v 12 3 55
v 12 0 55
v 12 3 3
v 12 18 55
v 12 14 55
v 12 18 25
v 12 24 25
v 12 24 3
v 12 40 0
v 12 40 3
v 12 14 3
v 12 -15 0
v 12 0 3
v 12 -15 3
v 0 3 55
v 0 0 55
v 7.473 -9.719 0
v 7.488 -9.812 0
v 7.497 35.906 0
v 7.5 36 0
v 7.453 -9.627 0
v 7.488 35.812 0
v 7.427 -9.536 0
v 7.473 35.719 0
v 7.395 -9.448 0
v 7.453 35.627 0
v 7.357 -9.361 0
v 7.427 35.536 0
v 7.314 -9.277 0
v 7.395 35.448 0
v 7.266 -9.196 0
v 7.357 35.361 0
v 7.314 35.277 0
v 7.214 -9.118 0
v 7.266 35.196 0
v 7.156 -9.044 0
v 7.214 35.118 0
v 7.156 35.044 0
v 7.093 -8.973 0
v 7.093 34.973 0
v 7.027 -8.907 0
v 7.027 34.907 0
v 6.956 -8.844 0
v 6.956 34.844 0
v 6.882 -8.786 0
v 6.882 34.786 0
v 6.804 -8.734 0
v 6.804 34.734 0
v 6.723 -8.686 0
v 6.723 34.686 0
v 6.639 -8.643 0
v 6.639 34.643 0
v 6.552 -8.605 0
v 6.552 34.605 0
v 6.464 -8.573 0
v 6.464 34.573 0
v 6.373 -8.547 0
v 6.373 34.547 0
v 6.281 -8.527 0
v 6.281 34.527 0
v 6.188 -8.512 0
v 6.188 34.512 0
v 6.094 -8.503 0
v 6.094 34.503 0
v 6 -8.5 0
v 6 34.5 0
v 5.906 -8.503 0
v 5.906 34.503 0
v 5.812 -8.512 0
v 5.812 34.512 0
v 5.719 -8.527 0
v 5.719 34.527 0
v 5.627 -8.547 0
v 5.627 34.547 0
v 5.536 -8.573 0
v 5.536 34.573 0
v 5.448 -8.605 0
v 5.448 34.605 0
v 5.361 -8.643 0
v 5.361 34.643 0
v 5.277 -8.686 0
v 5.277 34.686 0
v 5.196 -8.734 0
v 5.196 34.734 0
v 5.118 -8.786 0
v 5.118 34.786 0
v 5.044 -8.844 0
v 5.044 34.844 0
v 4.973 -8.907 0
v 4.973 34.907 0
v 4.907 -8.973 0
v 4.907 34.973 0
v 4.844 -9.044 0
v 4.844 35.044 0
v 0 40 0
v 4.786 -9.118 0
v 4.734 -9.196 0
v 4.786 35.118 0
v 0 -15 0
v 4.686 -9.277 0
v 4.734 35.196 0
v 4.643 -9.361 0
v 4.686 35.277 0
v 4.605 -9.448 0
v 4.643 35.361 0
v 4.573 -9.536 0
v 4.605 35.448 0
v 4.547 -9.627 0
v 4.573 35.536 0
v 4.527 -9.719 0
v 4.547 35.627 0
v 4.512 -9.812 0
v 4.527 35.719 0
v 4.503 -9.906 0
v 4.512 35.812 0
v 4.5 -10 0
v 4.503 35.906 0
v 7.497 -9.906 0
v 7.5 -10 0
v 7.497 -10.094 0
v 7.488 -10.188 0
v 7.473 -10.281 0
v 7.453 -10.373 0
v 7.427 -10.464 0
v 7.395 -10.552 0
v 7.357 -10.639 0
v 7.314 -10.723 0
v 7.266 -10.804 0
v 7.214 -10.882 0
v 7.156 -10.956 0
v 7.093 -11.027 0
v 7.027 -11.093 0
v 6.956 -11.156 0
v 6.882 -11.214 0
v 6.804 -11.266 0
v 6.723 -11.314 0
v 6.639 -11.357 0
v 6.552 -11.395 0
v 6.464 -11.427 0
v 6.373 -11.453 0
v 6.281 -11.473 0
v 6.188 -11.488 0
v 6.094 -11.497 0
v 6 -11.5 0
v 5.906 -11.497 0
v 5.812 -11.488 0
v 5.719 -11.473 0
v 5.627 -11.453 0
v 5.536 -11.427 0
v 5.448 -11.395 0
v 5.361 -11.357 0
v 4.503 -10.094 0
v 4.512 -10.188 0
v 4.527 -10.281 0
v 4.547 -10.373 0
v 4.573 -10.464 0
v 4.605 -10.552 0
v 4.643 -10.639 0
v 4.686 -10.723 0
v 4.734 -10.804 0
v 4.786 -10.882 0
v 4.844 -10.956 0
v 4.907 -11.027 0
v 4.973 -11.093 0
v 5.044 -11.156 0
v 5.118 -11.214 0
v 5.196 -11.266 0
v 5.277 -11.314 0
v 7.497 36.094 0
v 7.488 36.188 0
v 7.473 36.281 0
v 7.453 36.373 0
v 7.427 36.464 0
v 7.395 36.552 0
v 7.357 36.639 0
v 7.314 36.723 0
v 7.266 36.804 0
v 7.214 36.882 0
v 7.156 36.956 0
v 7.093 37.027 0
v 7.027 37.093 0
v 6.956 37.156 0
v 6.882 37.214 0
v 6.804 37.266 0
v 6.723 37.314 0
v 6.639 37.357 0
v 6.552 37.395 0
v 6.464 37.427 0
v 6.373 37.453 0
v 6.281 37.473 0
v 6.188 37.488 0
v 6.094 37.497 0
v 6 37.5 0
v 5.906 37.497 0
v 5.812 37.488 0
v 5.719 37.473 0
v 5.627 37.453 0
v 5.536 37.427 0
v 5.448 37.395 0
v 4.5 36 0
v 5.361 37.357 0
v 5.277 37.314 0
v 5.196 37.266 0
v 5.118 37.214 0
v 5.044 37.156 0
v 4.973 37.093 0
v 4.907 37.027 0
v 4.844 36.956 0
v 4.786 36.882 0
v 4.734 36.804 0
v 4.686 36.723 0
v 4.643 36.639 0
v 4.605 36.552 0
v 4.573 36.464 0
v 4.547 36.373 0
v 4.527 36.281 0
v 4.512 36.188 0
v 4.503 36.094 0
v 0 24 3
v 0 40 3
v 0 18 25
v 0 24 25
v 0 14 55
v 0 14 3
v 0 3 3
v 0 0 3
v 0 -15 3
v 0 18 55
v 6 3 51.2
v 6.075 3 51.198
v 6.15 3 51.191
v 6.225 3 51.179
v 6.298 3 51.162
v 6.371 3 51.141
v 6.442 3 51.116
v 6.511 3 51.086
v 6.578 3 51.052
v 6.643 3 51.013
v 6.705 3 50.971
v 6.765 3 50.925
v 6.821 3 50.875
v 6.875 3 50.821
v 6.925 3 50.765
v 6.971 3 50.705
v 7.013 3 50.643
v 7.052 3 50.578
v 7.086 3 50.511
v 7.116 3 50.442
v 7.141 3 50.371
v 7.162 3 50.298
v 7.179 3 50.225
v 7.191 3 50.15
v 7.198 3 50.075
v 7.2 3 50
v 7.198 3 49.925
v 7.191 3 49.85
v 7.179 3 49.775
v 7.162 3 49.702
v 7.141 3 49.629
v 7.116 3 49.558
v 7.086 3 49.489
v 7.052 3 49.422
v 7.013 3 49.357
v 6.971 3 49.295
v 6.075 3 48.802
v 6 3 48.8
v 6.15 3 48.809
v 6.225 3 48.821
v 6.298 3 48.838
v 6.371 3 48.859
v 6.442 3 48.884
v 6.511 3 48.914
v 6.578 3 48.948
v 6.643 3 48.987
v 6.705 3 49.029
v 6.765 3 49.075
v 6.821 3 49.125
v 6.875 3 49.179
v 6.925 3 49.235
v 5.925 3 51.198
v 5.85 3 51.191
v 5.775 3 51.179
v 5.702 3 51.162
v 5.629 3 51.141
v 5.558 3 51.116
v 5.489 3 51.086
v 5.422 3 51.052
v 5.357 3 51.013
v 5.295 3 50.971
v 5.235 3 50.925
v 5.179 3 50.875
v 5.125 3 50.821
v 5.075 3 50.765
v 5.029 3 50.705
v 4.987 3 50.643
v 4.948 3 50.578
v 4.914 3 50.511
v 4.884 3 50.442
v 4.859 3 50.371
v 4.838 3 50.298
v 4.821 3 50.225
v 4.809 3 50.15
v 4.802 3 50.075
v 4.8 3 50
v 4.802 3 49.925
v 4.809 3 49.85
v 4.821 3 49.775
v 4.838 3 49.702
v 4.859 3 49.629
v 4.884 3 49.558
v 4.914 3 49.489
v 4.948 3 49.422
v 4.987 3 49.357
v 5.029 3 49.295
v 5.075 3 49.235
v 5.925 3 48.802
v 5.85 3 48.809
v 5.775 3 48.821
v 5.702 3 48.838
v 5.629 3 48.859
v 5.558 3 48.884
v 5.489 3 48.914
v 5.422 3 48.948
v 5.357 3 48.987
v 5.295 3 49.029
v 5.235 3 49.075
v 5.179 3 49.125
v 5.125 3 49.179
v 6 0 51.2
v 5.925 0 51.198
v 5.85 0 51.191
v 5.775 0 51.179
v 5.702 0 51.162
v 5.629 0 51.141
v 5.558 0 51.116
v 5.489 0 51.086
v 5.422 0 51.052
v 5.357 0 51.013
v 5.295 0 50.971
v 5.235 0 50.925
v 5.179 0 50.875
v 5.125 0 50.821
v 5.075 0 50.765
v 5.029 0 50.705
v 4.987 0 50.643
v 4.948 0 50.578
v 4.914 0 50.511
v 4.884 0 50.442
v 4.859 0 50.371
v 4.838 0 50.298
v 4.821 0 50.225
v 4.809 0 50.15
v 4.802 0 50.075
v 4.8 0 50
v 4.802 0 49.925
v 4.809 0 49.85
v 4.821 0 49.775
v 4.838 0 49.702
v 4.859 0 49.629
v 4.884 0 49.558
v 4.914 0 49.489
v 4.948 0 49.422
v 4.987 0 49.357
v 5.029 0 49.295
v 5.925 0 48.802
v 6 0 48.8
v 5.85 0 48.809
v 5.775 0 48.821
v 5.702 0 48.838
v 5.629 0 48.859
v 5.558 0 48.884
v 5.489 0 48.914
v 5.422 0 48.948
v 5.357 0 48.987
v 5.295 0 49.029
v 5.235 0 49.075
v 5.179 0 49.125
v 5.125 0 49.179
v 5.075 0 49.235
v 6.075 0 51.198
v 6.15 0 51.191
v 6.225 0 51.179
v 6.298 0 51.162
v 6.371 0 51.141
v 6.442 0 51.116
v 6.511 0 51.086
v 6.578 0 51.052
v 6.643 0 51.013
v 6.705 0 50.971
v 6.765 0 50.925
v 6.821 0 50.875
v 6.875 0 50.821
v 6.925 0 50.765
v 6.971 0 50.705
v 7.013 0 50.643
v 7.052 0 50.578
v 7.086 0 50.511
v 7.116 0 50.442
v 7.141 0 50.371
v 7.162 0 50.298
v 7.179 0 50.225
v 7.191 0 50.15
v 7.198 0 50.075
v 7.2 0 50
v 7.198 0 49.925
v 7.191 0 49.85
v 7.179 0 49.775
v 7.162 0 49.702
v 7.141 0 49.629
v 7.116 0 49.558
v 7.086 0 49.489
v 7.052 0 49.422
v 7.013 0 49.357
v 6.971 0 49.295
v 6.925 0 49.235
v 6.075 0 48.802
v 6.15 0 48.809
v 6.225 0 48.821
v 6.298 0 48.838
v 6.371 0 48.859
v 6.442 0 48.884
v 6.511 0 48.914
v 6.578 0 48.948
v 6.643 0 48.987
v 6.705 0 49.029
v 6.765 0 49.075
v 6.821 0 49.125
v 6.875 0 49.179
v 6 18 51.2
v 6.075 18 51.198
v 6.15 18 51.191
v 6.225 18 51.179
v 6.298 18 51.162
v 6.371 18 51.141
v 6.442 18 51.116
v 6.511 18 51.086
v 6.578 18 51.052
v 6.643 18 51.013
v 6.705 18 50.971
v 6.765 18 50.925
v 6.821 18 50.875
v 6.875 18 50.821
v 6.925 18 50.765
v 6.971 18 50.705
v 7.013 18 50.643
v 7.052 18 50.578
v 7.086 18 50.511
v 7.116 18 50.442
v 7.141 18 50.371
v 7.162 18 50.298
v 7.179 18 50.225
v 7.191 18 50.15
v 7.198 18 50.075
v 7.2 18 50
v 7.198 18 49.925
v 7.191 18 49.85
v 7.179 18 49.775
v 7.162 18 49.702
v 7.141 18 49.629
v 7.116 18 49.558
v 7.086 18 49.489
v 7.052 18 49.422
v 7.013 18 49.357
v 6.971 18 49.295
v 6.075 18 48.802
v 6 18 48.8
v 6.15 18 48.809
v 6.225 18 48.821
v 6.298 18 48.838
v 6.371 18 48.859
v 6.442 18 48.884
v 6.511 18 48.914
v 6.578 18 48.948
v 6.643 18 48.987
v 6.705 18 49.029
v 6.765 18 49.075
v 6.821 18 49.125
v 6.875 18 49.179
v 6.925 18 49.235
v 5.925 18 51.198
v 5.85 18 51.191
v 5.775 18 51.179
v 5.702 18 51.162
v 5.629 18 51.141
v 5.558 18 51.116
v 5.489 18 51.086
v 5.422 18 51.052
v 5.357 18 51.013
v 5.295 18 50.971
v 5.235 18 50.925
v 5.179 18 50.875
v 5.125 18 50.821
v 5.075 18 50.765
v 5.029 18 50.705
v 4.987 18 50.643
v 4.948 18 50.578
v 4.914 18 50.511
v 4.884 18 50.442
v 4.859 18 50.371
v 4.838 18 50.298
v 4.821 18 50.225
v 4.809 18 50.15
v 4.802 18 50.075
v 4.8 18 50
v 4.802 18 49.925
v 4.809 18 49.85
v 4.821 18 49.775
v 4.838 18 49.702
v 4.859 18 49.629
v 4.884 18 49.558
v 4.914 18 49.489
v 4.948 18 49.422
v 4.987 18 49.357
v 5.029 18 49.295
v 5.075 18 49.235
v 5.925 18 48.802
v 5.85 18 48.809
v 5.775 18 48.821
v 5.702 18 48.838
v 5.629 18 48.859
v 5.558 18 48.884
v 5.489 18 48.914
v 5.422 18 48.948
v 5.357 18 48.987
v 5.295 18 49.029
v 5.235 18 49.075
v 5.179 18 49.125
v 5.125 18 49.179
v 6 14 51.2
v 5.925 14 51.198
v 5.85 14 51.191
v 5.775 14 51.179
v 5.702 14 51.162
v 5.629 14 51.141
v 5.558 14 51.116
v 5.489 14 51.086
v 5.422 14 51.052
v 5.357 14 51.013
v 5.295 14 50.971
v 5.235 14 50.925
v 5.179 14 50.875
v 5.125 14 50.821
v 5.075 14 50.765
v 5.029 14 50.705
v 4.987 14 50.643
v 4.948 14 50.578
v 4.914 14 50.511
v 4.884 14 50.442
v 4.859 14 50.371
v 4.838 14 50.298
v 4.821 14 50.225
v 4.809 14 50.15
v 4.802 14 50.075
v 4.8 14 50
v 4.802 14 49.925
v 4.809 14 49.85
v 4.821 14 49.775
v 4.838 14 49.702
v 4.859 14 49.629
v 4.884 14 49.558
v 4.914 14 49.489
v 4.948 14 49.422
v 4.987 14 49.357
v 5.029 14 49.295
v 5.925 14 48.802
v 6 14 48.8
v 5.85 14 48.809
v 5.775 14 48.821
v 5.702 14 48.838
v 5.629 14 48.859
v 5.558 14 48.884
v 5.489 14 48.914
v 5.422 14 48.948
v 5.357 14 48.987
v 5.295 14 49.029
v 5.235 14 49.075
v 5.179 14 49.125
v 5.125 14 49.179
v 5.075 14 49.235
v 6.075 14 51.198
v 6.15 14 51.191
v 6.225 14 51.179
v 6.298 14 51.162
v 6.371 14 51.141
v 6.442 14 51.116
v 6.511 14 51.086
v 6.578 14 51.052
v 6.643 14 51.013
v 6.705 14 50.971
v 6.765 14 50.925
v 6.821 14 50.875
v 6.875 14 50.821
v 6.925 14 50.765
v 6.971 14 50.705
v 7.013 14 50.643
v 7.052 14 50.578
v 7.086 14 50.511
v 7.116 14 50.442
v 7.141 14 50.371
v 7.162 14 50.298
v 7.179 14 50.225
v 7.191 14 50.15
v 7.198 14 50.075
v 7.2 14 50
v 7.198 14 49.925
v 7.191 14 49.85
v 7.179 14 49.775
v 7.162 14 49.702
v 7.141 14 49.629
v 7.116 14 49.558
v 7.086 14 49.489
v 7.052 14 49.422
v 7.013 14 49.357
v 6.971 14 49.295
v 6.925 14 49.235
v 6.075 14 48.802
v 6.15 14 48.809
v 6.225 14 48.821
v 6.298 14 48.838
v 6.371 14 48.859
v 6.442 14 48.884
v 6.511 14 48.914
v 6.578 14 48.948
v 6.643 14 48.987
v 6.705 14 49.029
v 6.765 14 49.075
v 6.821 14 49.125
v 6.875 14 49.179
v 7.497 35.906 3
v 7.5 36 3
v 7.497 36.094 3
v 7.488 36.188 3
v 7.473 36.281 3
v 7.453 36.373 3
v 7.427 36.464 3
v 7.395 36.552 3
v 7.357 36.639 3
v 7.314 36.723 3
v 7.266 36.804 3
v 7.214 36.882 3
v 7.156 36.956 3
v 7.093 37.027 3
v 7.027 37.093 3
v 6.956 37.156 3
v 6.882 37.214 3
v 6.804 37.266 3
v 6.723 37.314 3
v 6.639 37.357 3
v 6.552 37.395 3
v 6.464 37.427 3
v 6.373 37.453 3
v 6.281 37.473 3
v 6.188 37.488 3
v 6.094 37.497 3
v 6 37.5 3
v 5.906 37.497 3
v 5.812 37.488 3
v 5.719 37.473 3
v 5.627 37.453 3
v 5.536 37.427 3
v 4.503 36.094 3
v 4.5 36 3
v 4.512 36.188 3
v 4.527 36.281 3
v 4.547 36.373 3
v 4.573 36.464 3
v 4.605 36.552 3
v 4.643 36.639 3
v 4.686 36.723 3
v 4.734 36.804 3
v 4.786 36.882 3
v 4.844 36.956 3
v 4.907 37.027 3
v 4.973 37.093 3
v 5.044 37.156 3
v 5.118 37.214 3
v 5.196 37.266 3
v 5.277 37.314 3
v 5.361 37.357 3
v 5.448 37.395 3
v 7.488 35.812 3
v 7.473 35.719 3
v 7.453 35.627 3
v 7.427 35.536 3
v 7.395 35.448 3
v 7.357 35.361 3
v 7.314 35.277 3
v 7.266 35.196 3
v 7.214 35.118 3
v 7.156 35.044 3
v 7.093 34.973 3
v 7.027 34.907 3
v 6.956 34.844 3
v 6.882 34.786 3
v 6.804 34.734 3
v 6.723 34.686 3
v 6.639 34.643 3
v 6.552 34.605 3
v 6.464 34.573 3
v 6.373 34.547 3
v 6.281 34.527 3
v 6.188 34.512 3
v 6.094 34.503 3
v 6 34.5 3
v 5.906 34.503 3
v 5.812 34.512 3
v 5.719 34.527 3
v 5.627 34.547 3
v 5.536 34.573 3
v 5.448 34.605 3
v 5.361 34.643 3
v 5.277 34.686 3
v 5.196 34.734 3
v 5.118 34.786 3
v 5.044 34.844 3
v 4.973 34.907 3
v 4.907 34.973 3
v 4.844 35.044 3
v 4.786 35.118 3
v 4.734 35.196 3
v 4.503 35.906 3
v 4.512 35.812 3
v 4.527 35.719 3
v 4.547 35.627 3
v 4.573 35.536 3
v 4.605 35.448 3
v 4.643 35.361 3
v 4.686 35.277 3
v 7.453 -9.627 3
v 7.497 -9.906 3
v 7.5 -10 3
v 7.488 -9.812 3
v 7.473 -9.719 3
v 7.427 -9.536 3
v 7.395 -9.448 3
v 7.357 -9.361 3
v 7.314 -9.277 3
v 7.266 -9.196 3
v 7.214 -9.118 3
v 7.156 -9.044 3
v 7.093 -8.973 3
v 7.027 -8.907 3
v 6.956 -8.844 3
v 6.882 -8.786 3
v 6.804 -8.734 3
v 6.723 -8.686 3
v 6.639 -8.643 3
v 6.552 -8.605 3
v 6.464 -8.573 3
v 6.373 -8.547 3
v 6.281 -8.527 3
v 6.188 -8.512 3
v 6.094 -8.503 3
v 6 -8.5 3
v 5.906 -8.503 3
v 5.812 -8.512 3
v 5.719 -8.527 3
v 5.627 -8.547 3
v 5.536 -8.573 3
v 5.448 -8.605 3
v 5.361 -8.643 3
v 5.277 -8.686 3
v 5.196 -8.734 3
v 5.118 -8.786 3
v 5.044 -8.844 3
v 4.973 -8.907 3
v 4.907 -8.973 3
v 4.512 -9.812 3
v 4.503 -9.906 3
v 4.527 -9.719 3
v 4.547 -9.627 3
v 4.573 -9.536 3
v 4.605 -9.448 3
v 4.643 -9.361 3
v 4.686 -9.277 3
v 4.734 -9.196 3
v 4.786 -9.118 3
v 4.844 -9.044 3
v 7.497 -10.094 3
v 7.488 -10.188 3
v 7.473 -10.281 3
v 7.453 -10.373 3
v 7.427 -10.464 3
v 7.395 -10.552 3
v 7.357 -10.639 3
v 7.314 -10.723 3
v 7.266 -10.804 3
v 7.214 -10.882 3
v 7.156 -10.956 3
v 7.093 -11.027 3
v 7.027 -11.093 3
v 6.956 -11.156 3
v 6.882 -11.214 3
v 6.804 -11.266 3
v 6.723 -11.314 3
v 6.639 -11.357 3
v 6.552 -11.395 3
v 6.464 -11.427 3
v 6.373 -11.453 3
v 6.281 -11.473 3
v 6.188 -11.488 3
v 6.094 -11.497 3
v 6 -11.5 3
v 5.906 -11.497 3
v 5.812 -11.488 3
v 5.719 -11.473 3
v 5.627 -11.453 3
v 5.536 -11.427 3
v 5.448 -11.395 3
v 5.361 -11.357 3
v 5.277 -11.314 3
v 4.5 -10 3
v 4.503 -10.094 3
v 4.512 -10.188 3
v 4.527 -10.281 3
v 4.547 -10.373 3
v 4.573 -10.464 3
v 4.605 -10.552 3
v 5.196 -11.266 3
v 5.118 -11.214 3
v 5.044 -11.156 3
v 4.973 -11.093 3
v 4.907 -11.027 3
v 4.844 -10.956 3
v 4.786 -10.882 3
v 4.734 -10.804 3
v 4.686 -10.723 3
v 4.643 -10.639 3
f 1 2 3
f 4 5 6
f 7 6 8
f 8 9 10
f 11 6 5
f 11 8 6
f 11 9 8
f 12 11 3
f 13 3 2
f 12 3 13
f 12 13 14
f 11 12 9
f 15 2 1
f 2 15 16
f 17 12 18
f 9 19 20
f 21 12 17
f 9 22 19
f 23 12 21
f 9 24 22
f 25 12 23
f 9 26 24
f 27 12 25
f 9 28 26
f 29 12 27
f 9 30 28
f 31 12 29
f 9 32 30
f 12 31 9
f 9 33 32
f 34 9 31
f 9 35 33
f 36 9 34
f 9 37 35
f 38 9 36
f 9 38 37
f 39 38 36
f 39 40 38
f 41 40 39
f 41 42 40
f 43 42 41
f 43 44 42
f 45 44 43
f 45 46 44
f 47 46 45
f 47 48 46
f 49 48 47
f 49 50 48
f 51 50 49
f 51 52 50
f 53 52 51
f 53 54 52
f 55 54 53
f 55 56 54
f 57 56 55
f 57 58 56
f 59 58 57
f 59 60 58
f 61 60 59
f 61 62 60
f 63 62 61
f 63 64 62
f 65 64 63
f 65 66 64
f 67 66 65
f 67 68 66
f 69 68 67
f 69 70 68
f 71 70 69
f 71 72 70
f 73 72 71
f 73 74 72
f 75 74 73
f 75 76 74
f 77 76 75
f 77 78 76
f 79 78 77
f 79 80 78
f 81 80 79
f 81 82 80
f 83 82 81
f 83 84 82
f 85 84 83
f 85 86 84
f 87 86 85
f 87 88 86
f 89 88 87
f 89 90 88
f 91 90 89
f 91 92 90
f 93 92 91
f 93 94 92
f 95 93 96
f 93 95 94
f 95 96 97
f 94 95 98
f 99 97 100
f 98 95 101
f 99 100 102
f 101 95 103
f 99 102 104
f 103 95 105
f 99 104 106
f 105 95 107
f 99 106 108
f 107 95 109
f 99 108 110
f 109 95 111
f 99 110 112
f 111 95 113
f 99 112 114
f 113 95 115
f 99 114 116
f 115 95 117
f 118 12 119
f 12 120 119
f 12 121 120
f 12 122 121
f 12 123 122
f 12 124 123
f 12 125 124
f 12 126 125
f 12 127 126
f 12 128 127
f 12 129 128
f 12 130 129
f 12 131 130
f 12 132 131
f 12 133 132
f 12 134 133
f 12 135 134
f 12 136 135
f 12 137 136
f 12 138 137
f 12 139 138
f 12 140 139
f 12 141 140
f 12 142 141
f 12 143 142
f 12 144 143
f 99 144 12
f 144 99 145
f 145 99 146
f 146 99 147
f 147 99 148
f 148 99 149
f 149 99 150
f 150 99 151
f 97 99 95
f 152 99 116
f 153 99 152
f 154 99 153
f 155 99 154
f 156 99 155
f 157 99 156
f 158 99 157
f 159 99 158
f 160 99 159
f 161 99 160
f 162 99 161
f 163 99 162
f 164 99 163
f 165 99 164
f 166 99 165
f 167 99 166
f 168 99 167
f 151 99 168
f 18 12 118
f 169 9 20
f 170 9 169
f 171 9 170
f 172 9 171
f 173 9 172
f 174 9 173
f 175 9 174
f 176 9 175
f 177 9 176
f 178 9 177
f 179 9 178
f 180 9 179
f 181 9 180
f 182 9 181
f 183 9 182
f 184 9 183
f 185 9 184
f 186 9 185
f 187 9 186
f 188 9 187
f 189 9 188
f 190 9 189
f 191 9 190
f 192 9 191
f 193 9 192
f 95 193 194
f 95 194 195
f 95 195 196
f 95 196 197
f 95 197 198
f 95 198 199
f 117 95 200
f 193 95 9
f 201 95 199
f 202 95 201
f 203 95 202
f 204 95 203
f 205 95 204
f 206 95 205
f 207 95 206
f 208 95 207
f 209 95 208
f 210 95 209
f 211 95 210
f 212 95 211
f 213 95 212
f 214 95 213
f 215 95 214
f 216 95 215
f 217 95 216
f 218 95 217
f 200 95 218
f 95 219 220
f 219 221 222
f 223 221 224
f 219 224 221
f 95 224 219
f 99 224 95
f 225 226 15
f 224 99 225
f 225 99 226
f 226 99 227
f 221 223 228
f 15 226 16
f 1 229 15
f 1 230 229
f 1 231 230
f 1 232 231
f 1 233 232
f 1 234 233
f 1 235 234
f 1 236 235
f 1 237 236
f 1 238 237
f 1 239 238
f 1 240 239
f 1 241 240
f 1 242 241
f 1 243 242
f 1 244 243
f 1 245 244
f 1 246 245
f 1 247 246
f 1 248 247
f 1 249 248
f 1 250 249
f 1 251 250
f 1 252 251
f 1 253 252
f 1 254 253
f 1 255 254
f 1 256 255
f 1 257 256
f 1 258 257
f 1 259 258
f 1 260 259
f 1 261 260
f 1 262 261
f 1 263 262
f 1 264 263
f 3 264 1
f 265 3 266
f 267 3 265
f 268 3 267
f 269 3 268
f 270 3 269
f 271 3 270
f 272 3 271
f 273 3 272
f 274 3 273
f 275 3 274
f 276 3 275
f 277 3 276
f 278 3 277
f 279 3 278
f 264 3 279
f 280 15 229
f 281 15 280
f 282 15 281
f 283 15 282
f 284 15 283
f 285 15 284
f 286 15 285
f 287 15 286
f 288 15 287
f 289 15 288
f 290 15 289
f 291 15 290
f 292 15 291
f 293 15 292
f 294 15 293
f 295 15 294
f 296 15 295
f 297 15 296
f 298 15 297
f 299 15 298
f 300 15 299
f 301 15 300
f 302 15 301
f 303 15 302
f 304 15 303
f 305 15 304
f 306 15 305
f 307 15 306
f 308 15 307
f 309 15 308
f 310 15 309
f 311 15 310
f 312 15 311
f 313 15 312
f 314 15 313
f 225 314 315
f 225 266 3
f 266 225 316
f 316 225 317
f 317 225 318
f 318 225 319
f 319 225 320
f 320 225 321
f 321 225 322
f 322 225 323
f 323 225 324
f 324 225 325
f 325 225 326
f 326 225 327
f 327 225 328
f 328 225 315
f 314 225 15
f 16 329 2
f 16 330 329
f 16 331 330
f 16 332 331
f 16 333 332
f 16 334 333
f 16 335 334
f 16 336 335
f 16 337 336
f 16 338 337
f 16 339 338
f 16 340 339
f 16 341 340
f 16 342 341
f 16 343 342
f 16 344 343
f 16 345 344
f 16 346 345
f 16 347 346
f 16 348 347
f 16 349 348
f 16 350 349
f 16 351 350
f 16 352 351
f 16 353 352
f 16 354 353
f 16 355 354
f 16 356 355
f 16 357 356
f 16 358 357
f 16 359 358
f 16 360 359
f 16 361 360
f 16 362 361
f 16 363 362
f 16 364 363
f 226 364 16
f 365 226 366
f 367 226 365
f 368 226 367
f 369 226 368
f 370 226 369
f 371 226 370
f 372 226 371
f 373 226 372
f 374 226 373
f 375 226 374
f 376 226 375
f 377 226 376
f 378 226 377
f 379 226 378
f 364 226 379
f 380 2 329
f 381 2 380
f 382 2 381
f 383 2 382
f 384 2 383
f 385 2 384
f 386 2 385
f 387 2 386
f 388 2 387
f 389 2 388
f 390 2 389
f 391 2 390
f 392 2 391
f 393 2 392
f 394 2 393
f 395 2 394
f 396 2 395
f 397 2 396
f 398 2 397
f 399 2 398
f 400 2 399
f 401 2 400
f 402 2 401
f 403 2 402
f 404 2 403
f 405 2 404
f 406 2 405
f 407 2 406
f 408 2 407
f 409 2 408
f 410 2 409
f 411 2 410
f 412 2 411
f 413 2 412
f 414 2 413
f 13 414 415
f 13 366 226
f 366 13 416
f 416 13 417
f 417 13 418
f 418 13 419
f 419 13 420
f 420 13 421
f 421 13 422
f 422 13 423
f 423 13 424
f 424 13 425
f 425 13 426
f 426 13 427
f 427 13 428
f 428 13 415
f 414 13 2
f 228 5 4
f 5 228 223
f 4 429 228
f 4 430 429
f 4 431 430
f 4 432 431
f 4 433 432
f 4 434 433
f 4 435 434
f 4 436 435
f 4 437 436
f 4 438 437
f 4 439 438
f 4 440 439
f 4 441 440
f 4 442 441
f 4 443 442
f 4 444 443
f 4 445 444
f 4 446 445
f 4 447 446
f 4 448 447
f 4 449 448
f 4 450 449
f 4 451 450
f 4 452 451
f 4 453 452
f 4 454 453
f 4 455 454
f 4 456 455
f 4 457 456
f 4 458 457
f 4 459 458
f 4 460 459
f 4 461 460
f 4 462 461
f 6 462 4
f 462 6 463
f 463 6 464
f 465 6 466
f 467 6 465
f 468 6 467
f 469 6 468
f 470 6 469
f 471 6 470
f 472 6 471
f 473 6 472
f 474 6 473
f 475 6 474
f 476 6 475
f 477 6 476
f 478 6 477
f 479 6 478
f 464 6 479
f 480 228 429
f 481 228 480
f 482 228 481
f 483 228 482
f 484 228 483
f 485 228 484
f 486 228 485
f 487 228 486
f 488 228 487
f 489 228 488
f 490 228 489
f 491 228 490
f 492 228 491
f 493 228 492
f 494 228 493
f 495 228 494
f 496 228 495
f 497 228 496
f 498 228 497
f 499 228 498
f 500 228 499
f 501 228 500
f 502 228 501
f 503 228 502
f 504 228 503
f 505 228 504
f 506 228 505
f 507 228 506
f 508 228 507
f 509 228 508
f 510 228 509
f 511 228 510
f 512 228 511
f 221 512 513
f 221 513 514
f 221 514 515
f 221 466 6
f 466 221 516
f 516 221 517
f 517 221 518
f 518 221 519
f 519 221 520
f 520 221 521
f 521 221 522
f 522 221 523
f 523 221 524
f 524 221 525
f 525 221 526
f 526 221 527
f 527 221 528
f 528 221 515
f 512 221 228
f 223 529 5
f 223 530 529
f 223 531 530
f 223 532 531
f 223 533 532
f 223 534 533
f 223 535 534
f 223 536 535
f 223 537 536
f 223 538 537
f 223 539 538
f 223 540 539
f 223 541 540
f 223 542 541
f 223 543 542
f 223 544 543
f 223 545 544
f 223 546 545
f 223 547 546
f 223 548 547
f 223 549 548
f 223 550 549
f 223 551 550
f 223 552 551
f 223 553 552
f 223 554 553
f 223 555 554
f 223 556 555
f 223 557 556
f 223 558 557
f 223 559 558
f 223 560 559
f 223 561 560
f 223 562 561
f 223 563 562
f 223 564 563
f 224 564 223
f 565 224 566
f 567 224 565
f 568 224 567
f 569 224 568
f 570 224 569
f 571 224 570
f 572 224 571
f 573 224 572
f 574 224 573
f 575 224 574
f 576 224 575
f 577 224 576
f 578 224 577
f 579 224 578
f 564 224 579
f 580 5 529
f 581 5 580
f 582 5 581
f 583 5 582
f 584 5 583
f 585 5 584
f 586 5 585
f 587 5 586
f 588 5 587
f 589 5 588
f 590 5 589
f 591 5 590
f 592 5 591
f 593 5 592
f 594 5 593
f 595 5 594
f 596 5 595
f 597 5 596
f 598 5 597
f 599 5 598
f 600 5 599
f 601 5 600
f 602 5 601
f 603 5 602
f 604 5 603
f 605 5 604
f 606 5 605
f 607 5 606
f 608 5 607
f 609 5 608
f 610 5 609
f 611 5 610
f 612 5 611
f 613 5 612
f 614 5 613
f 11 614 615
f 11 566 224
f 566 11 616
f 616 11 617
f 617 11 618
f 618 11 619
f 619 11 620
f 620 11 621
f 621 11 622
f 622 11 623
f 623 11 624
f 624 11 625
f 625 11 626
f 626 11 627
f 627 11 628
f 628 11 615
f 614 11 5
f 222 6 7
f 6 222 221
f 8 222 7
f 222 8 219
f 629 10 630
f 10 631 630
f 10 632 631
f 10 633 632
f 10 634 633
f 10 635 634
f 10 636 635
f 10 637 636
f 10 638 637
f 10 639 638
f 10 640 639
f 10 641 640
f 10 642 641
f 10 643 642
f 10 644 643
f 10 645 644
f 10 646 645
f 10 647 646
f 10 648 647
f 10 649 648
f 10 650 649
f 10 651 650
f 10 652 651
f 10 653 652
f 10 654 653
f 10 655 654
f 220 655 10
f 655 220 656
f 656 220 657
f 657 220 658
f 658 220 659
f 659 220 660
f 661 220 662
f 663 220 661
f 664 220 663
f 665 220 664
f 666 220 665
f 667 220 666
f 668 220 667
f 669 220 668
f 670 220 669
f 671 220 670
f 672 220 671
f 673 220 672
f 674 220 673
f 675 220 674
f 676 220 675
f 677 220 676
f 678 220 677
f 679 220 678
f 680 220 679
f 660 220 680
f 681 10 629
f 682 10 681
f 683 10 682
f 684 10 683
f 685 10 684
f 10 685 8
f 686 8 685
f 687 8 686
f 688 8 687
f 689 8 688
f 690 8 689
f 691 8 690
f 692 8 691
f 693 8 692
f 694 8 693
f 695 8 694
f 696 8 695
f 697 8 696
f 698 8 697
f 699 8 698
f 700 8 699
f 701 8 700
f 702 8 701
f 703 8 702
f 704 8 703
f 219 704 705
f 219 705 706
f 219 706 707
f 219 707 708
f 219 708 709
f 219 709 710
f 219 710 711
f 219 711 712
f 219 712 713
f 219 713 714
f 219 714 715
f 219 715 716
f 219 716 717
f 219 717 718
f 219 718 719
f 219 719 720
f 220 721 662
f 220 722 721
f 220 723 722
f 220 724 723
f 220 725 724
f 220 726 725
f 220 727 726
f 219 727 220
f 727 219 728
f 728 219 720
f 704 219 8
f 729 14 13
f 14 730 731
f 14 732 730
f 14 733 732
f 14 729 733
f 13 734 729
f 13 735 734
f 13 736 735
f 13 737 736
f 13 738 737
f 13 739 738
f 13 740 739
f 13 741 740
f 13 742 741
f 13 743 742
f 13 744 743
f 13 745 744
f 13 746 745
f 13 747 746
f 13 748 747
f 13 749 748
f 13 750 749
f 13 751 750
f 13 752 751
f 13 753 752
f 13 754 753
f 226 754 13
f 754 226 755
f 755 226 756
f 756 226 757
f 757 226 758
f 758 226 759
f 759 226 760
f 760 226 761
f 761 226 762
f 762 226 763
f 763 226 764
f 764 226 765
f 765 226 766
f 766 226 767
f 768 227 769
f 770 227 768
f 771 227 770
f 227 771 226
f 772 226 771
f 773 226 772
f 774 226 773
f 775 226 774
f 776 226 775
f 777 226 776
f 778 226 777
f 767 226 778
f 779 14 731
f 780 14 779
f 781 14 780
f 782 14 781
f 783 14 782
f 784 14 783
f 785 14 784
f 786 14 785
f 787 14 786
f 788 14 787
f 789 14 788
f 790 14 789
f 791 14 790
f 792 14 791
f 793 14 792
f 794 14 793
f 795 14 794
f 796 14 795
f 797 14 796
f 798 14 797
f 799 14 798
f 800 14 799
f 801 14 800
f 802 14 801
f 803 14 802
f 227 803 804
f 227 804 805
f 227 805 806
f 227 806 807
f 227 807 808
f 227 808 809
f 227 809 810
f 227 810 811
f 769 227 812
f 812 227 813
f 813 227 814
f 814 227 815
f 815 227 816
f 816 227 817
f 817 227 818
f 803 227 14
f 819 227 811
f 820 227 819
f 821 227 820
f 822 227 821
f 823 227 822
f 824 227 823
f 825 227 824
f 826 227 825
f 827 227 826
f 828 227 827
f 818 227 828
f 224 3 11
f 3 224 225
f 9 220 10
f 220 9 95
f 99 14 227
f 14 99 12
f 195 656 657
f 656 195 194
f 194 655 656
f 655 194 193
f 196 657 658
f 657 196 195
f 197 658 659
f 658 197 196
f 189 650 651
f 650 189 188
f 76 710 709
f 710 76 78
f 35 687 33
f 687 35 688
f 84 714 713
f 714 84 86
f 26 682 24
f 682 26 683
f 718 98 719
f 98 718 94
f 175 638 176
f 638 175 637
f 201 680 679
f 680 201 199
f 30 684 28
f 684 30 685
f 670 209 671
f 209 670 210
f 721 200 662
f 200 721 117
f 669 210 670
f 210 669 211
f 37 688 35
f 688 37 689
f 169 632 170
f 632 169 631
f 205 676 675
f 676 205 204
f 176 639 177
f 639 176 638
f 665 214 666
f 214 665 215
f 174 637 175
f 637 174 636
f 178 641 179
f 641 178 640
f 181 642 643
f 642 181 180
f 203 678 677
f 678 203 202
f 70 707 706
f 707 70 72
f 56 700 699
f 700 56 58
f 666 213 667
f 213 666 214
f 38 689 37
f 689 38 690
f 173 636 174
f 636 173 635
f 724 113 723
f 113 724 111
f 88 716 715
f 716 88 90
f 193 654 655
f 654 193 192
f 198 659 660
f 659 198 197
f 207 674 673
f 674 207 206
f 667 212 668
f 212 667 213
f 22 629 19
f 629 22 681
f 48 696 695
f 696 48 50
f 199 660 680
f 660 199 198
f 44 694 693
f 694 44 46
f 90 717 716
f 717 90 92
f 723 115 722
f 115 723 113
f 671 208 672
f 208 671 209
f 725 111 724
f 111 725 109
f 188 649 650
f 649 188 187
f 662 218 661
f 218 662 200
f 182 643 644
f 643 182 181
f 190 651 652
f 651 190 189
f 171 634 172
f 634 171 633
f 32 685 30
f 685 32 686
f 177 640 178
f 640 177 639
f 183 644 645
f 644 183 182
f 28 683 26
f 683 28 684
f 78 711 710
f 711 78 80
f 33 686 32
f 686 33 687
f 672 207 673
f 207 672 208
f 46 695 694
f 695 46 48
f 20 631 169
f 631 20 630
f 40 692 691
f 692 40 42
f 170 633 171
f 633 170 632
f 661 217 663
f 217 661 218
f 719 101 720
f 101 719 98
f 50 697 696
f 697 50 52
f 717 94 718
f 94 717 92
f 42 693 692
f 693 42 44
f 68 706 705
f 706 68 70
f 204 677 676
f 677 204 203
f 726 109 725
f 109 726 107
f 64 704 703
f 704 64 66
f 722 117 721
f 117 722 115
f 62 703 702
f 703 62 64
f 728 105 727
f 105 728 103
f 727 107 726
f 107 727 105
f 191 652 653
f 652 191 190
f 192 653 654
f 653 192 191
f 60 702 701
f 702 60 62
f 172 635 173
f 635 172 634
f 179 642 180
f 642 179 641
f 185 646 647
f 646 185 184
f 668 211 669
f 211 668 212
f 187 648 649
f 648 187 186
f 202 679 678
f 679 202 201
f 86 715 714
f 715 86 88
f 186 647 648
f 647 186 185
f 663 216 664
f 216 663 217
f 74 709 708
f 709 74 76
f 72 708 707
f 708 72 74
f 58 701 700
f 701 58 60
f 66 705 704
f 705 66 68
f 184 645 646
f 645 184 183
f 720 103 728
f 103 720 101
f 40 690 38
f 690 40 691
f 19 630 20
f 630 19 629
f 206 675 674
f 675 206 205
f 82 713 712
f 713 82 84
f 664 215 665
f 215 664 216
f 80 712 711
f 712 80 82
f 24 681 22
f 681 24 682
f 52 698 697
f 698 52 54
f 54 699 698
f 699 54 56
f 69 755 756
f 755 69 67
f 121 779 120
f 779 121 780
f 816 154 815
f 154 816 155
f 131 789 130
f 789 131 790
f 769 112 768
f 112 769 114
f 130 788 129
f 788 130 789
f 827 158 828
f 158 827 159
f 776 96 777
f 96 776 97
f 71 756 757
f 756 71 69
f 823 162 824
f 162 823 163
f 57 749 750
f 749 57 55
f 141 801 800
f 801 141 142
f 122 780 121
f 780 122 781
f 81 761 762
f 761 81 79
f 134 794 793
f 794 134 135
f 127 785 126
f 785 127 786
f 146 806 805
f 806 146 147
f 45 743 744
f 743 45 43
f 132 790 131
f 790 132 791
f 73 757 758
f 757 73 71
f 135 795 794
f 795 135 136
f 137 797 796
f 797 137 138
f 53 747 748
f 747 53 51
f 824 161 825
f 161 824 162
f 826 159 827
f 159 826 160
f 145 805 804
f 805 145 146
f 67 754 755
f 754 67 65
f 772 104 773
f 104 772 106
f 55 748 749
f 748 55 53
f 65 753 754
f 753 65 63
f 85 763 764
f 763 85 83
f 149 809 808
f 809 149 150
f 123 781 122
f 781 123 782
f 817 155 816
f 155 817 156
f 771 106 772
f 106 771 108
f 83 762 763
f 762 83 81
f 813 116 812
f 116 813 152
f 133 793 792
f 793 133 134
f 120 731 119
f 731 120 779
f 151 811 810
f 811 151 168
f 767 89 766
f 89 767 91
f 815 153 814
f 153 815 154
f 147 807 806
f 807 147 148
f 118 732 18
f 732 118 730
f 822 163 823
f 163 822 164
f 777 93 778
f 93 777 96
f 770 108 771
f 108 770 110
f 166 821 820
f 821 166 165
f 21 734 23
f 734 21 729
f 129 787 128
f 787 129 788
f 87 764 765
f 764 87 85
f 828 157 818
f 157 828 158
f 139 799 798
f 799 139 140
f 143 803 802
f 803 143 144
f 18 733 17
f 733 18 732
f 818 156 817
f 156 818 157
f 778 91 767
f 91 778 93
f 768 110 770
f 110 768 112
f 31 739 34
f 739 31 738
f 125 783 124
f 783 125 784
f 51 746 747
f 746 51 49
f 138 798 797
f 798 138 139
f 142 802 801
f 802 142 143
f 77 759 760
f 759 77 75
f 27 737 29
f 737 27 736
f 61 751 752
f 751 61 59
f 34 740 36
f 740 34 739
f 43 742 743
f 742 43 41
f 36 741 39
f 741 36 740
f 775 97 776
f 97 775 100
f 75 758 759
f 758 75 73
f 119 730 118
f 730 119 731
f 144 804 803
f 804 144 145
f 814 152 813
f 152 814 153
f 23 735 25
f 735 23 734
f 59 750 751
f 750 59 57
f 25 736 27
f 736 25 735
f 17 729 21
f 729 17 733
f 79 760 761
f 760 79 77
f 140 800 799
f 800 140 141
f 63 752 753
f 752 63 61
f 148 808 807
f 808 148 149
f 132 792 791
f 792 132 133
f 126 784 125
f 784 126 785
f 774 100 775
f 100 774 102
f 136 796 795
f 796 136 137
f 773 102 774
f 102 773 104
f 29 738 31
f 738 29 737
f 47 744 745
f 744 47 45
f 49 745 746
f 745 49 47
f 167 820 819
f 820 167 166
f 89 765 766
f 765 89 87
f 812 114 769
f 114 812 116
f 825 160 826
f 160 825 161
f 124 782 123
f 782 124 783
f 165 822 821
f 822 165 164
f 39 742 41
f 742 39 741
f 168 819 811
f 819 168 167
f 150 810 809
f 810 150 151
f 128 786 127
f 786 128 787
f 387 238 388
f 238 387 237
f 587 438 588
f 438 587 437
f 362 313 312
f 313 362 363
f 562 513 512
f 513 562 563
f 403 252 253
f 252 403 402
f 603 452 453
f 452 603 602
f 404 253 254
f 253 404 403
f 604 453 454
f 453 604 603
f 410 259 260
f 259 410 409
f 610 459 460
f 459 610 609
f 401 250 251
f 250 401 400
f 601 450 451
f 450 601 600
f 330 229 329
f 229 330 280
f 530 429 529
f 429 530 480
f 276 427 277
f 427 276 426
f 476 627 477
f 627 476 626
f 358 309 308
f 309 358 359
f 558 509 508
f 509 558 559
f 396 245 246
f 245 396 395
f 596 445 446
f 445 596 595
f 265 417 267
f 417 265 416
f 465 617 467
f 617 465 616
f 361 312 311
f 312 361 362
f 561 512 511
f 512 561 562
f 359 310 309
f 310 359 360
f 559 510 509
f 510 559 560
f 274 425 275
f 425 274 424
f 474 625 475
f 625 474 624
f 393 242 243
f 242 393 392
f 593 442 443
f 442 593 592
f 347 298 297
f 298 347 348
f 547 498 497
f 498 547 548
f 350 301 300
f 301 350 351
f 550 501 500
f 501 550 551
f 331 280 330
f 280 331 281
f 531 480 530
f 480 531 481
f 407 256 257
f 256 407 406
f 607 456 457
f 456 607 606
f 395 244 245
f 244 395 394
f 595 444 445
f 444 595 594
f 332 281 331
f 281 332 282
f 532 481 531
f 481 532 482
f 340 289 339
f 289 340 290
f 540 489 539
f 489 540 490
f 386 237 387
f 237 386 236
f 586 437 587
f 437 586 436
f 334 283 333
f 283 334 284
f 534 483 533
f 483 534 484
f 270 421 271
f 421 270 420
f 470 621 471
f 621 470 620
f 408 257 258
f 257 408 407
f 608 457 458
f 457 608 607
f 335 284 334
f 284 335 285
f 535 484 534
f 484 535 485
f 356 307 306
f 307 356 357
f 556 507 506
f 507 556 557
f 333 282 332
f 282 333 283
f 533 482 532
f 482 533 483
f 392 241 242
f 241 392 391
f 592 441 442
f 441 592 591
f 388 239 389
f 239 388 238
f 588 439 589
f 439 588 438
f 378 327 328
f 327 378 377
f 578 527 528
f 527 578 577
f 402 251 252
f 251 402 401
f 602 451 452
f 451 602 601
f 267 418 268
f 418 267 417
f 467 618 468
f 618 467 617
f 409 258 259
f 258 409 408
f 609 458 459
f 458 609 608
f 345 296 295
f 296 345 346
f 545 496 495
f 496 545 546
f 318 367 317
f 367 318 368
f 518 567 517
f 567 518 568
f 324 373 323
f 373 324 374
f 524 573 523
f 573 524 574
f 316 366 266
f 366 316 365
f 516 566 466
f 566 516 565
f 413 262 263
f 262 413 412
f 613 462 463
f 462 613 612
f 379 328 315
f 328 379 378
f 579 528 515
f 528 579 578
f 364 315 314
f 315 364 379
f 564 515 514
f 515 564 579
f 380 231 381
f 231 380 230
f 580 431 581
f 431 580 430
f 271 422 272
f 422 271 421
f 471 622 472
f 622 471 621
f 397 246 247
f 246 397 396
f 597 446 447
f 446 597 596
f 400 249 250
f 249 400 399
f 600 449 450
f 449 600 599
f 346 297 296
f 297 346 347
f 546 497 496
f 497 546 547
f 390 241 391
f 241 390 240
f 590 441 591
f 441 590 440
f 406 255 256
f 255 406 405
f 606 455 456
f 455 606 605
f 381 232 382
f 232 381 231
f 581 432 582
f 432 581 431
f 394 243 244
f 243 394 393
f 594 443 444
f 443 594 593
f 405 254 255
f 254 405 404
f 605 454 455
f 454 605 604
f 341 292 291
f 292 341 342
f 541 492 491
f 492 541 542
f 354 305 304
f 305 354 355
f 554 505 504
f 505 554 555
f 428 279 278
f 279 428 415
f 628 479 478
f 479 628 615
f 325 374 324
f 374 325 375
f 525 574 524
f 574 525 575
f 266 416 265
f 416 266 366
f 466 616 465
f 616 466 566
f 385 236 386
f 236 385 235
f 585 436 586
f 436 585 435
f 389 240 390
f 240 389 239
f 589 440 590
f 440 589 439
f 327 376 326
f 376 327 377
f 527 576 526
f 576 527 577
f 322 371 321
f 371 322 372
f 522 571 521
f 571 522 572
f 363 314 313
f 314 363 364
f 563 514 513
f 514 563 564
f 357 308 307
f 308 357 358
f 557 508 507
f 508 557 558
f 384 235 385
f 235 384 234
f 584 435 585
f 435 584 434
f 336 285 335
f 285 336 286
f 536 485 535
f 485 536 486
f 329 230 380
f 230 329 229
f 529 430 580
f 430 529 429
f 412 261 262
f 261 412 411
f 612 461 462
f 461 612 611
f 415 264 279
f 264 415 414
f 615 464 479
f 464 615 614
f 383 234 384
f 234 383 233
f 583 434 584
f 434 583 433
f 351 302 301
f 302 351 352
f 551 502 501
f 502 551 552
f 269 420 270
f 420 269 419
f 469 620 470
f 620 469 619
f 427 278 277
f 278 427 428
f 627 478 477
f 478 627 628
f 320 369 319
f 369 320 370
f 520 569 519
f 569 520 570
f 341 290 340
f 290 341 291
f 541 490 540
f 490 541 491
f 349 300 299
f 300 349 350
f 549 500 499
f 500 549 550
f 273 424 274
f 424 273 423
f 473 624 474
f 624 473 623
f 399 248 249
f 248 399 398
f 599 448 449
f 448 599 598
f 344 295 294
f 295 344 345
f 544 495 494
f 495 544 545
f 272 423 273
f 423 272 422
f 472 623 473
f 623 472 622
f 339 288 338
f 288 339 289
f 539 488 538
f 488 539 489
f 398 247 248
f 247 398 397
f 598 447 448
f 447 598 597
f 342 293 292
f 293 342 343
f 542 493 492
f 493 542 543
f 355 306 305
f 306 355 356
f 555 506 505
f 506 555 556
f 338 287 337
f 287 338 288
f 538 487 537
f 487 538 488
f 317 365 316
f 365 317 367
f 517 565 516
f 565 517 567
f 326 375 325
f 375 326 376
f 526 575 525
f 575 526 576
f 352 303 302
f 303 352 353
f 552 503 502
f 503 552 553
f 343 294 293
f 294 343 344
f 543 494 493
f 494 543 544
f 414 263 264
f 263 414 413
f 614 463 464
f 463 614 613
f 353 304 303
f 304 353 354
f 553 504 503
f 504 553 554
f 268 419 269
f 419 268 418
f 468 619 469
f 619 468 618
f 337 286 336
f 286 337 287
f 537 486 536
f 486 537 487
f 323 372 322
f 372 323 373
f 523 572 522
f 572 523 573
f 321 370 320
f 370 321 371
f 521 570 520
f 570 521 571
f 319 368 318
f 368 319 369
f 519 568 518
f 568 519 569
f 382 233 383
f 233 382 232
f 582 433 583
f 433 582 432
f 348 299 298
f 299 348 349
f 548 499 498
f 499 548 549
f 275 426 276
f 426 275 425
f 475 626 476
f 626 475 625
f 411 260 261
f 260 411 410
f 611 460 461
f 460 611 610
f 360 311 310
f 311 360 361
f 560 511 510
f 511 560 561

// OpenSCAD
        difference(){
            union(){

                translate([0,0,0]){
                    cube([12,3,55], center=false);
                }      


                translate([0,14,0]){
                    cube([12,4,55], center=false);
                }      

                translate([0,14,0]){
                    cube([12,10,25], center=false);
                }      


                translate([0,-15,0]){
                    cube([12,55,3], center=false);
                }      


            }
            union() {

                translate([6,36,-1]){
                    rotate([0,0,90]){
                        cylinder(h=10, r=1.5, $fn=100, center=false);
                    }
                }  
                translate([6,-10,-1]){
                    rotate([0,0,90]){
                        cylinder(h=10, r=1.5, $fn=100, center=false);
                    }
                }  


                translate([6,50,50]){
                    rotate([90,0,0]){
                        cylinder(h=100, r=1.2, $fn=100, center=false);
                    }
                }  


            }
        }
